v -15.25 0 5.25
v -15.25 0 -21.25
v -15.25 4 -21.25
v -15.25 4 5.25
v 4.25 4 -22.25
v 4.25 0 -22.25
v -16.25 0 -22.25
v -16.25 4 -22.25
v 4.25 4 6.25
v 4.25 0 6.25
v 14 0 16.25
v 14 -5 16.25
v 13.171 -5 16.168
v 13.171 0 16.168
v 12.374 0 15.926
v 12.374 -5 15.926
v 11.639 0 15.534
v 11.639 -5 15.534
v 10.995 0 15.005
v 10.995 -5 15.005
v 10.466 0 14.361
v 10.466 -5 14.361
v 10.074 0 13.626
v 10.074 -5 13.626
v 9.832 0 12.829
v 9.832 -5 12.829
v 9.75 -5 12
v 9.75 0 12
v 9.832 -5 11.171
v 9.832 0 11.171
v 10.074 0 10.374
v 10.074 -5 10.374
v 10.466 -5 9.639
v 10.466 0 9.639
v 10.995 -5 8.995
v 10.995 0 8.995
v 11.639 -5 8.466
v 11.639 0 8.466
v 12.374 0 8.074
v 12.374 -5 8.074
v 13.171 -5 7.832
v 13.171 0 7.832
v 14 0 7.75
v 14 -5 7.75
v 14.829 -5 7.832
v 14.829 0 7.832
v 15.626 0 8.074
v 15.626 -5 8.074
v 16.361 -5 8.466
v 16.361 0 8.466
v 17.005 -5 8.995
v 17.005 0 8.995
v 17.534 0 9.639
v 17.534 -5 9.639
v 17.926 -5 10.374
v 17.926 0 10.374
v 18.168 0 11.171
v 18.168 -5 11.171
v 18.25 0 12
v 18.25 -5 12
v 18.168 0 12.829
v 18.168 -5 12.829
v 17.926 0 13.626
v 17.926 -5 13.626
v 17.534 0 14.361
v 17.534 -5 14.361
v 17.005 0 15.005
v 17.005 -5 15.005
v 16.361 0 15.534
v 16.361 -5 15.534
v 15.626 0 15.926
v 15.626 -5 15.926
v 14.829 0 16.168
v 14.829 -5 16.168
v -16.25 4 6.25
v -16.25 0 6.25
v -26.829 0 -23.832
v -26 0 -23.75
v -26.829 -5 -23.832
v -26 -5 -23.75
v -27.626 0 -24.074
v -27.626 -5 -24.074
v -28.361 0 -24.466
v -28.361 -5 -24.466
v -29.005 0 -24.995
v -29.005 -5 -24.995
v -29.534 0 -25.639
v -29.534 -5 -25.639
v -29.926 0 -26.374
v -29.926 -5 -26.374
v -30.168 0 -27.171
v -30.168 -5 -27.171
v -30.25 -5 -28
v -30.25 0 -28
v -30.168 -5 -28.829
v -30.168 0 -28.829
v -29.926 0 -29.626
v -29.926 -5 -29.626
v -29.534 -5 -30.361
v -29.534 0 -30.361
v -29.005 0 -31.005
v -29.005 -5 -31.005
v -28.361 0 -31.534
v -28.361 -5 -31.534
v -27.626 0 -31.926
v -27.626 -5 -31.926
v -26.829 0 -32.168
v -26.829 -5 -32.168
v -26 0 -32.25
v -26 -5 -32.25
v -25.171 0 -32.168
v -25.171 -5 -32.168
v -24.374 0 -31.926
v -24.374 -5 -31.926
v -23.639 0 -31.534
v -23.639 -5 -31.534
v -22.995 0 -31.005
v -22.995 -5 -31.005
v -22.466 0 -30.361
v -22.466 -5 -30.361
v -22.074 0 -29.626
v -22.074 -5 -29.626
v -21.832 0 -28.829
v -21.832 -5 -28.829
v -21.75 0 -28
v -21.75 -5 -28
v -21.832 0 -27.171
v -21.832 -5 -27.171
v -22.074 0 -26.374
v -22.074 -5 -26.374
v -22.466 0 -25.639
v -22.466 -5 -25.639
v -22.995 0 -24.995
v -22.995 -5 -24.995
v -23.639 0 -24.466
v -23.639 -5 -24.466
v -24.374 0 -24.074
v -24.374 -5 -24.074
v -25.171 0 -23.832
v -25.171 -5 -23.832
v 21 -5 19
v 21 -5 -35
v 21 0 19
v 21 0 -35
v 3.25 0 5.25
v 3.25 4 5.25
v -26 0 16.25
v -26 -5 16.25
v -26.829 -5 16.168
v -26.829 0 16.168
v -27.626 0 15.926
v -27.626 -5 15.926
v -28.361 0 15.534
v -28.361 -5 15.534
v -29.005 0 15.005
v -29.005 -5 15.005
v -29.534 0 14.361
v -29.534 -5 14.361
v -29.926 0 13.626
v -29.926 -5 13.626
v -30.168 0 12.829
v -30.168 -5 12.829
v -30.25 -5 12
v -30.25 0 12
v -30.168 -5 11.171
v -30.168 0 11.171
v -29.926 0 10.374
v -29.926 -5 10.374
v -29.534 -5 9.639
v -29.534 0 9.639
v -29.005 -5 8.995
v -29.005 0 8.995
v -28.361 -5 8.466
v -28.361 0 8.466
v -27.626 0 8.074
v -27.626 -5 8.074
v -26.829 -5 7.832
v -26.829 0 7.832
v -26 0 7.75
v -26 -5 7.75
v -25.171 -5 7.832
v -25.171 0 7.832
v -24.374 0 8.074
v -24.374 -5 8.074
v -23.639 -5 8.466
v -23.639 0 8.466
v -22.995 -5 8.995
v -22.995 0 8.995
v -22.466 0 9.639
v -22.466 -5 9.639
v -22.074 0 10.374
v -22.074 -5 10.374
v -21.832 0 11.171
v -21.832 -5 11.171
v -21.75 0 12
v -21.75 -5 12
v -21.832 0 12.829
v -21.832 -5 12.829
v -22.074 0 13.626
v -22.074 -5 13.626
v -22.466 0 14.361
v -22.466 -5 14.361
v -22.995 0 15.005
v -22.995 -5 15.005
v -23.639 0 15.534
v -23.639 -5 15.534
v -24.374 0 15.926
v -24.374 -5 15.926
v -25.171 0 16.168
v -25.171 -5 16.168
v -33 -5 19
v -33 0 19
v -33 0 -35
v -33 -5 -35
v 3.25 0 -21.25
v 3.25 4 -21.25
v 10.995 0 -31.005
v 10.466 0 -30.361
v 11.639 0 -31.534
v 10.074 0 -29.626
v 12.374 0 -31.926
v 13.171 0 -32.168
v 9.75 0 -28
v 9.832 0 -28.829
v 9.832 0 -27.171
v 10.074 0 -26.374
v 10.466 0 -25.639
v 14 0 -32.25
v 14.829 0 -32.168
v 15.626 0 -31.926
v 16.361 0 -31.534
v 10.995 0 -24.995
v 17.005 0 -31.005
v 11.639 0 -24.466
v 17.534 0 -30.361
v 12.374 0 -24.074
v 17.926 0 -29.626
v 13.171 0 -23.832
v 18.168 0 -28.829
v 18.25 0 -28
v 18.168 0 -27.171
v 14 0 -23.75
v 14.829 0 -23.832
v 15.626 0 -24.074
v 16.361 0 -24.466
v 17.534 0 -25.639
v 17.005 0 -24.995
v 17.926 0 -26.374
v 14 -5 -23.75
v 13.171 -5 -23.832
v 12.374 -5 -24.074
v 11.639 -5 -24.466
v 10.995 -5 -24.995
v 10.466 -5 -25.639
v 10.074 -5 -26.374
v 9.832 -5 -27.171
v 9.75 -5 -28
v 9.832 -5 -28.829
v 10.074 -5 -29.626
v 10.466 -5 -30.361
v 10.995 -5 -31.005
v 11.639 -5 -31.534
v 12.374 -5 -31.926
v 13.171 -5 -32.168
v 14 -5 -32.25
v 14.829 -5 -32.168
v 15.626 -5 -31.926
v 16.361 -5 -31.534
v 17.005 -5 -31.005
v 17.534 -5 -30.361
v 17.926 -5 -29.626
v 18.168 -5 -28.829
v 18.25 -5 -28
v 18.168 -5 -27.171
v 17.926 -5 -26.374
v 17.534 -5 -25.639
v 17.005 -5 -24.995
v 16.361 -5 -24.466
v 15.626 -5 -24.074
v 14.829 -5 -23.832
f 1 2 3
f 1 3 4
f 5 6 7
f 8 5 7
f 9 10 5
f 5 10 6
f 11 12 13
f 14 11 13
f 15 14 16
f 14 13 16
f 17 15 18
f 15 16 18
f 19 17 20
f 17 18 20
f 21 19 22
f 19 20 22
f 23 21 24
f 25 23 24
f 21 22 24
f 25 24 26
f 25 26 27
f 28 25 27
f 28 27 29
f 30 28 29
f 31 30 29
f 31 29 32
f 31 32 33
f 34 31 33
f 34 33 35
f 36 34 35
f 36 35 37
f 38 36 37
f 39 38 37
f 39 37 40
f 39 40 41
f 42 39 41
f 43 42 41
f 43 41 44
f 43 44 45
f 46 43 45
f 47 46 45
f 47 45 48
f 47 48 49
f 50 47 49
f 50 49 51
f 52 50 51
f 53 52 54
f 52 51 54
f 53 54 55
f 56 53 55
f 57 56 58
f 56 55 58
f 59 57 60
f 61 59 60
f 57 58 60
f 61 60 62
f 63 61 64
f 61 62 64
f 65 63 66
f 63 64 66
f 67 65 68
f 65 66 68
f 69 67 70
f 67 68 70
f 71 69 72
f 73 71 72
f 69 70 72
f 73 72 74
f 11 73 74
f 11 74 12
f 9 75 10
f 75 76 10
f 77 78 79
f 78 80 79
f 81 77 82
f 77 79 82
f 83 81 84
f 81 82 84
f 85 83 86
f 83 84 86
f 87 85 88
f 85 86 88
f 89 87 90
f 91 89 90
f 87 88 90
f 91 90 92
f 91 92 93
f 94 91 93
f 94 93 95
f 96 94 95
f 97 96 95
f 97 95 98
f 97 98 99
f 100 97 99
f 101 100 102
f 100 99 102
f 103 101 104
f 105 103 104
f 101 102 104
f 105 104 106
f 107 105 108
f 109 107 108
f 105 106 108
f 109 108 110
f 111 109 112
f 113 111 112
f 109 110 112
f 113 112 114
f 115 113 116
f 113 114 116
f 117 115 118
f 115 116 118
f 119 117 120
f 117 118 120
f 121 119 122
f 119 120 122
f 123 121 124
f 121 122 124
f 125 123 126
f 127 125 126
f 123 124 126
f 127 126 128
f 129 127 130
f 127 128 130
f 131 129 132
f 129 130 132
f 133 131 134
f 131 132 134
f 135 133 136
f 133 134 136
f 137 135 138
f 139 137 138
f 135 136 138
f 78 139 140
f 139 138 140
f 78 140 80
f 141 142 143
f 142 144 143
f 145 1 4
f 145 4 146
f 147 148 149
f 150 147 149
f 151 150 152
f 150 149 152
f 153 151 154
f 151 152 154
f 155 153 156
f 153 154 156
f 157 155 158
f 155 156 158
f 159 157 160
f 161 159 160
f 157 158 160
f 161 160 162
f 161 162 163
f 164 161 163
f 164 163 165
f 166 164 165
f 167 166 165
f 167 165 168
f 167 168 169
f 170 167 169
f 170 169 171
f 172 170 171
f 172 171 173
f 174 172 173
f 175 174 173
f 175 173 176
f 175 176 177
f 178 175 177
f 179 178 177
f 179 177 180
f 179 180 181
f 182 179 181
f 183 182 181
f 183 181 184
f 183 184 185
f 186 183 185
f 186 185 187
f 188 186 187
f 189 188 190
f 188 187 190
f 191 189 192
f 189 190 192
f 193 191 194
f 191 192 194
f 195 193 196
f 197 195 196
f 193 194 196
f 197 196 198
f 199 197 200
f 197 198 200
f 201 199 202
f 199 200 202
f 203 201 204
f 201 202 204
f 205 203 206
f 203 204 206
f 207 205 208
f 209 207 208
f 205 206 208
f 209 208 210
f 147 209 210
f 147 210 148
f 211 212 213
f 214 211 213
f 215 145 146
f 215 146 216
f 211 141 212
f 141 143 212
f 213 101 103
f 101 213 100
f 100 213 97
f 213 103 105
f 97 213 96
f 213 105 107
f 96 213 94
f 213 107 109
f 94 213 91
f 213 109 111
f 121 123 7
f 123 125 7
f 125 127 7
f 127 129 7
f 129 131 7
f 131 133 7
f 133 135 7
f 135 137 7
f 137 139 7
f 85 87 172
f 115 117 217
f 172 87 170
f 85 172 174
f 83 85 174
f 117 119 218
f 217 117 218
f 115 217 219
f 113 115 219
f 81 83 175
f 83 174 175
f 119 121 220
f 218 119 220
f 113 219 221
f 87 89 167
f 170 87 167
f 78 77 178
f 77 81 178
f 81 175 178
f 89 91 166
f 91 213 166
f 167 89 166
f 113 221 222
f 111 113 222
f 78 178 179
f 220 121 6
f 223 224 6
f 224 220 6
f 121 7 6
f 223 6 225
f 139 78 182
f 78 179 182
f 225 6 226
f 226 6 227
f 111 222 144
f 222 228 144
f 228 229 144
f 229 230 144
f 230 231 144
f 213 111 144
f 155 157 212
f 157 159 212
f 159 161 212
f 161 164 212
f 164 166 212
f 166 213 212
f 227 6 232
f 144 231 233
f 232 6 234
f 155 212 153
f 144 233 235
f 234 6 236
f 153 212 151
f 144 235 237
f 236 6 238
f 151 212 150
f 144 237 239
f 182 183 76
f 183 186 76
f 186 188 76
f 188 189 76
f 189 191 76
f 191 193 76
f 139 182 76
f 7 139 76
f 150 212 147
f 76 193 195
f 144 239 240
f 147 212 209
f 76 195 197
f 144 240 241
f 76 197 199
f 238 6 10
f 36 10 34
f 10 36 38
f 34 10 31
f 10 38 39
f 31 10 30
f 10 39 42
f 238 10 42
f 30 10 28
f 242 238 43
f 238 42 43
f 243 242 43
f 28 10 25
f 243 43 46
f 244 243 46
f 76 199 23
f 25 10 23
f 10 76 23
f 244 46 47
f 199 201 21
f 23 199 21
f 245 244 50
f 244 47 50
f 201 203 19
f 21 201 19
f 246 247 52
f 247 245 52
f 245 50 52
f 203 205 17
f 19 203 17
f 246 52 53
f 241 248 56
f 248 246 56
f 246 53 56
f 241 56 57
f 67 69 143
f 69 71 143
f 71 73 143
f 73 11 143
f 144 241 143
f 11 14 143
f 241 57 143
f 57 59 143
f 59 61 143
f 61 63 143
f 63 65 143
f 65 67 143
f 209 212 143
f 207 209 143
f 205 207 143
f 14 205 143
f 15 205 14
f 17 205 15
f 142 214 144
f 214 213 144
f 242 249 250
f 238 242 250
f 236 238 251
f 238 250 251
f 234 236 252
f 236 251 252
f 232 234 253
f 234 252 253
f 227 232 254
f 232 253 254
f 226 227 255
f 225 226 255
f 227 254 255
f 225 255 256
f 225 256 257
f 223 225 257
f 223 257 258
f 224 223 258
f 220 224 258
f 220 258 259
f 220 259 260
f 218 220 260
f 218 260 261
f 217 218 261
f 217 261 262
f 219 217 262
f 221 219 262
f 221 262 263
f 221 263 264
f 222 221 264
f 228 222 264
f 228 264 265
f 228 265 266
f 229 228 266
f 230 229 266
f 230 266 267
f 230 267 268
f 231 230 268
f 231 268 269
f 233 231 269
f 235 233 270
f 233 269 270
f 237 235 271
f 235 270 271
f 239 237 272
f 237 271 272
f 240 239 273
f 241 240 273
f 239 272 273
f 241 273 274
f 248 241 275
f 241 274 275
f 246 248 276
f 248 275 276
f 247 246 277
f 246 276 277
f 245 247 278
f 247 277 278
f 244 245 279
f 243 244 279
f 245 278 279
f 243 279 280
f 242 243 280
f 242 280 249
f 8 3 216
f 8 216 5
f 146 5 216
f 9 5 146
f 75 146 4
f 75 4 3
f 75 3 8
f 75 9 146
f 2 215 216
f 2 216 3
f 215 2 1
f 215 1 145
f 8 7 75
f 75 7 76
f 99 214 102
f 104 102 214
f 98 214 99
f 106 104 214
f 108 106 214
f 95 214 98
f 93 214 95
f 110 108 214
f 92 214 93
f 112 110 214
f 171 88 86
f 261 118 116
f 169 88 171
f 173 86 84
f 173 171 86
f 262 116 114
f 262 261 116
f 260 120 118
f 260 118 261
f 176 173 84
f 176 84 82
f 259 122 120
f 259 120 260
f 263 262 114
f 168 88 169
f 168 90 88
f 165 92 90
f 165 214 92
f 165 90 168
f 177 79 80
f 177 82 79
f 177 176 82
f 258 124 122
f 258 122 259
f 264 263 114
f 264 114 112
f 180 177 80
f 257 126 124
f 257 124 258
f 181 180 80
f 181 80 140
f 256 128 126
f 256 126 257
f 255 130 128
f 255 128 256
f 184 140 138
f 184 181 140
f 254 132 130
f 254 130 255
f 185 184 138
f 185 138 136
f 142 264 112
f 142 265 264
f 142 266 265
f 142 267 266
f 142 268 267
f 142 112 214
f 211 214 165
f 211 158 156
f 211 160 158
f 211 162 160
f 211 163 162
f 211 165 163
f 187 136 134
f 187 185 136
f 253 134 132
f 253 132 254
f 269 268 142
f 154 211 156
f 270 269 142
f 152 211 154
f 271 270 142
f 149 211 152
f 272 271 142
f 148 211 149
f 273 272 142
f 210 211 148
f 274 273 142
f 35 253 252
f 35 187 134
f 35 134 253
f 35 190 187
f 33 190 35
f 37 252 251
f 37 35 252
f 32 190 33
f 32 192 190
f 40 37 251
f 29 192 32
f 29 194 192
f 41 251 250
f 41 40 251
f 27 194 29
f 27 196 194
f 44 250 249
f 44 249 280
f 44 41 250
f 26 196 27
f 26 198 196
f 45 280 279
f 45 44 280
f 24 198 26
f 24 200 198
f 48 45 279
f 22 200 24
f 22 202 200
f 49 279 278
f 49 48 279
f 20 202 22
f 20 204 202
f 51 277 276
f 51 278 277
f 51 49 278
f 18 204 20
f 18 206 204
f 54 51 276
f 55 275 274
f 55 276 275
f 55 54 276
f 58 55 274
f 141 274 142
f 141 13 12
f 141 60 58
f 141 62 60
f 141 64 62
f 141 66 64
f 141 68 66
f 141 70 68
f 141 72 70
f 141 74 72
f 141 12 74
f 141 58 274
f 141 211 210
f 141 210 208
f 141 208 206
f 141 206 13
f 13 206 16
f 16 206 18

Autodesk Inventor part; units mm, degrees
ref_plane "YZ Plane" through (0, 0, 0) normal (1, 0, 0) x (0, 1, 0)
ref_plane "XZ Plane" through (0, 0, 0) normal (0, 1, 0) x (-1, 0, 0)
ref_plane "XY Plane" through (0, 0, 0) normal (0, 0, 1) x (1, 0, 0)
sketch "Skizze1" plane through (0, 0, 0) normal (0, 1, 0) x (-1, 0, 0)
  line L0 (0, 0) -> (12, 0)
  line L1 (12, 0) -> (12, -16)
  line L2 (12, -16) -> (0, -16)
  line L3 (0, -16) -> (0, 0)
  line L4 (17, 5) -> (17, -21)
  line L5 (-5, -21) -> (-5, 5)
  line L6 (-1, 1) -> (13, 1)
  line L7 (13, 1) -> (13, -17)
  line L8 (13, -17) -> (-1, -17)
  line L9 (-1, -17) -> (-1, 1)
  line L10 (1.75, -1.75) -> (10.25, -1.75)
  line L11 (10.25, -1.75) -> (10.25, -14.25)
  line L12 (10.25, -14.25) -> (1.75, -14.25)
  line L13 (1.75, -14.25) -> (1.75, -1.75)
  line L14 (0.75, -0.75) -> (11.25, -0.75)
  line L15 (11.25, -0.75) -> (11.25, -15.25)
  line L16 (11.25, -15.25) -> (0.75, -15.25)
  line L17 (0.75, -15.25) -> (0.75, -0.75)
  line L18 (15.25, 5.25) -> (-3.25, 5.25)
  line L19 (-3.25, 5.25) -> (-3.25, -21.25)
  line L20 (-3.25, -21.25) -> (15.25, -21.25)
  line L21 (15.25, -21.25) -> (15.25, 5.25)
  line L22 (16.25, 6.25) -> (-4.25, 6.25)
  line L23 (-4.25, 6.25) -> (-4.25, -22.25)
  line L24 (-4.25, -22.25) -> (16.25, -22.25)
  line L25 (16.25, -22.25) -> (16.25, 6.25)
  point P0 (6, 0)
  point P1 (6, 5)
  point P2 (6, -16)
  point P3 (12, -8)
  point P4 (6, -1.75)
  point P5 (6, -14.25)
  point P6 (10.25, -8)
  point P7 (1.75, -8)
  point P8 (6, -21.25)
  dimension "d0" = 16
  dimension "d1" = 12
  dimension "d2" = 5
  dimension "d3" = 5
  dimension "d56" = 1
  dimension "d57" = 1
  dimension "d58" = 1
  dimension "d60" = 1.75
  dimension "d61" = 1.75
  dimension "d63" = 8.5
  dimension "d64" = 1
  dimension "d65" = 1
  dimension "d67" = 1
  dimension "d69" = 12.5
  dimension "d70" = 1
  dimension "d71" = 1.75
  dimension "d72" = 1.75
  dimension "d74" = 7
  dimension "d76" = 7
  dimension "d77" = 5
  dimension "d78" = 5
  dimension "d80" = 1
  dimension "d81" = 1
  dimension "d82" = 1
  dimension "d83" = 1
ref_plane "Arbeitsebene1" through (0, 0, 0) normal (0, -1, 0) x (1, 0, 0)
sketch "Skizze2" plane through (0, 0, 0) normal (0, -1, 0) x (1, 0, 0)
  line L0 (21, 19) -> (-33, 19)
  line L1 (-33, 19) -> (-33, -35)
  line L2 (-33, -35) -> (21, -35)
  line L3 (21, -35) -> (21, 19)
  line L4 (-17, -21) -> (-17, 5) projected
  line L5 (5, -21) -> (-17, -21) projected
  line L6 (5, 5) -> (5, -21) projected
  line L7 (-17, 5) -> (5, 5) projected
  point P0 (0, 0)
  dimension "d11" = 16
  dimension "d12" = 14
  dimension "d13" = 16
  dimension "d14" = 14
  dimension "d35" = 54
  dimension "d36" = 54
extrude "Extrusion2" add sketch "Skizze2" along normal blind 5 contours L3 L2 L1 L0 | L4 L7 L6 L5
ref_plane "Arbeitsebene2" through (0, 0, 0) normal (0, 1, 0) x (1, 0, 0)
sketch "Skizze4" plane through (0, 0, 0) normal (0, 1, 0) x (1, 0, 0)
  line L0 (21, 35) -> (21, -19) projected
  line L1 (-33, 35) -> (21, 35) projected
  line L2 (21, -19) -> (-33, -19) projected
  line L3 (-33, -19) -> (-33, 35) projected
  point P0 (0, 0)
  point P1 (14, 28)
  point P2 (14, -12)
  point P3 (-26, -12)
  point P4 (-26, 28)
  dimension "d44" = 7
  dimension "d45" = 7
  dimension "d46" = 7
  dimension "d47" = 7
  dimension "d48" = 7
  dimension "d49" = 7
  dimension "d50" = 7
  dimension "d51" = 7
  dimension "d52" = 40
  dimension "d53" = 40
  dimension "d54" = 40
  dimension "d55" = 40
hole "Bohrung1" at (14, 0, -28) at (14, 0, 12) at (-26, 0, 12) at (-26, 0, -28) direction (0, -1, 0) diameter 8.5 depth 5
extrude "Extrusion4" add sketch "Skizze1" along normal blind 4 contours L25 L24 L23 L22
properties part number "Magazin_1_3D-Druck"
